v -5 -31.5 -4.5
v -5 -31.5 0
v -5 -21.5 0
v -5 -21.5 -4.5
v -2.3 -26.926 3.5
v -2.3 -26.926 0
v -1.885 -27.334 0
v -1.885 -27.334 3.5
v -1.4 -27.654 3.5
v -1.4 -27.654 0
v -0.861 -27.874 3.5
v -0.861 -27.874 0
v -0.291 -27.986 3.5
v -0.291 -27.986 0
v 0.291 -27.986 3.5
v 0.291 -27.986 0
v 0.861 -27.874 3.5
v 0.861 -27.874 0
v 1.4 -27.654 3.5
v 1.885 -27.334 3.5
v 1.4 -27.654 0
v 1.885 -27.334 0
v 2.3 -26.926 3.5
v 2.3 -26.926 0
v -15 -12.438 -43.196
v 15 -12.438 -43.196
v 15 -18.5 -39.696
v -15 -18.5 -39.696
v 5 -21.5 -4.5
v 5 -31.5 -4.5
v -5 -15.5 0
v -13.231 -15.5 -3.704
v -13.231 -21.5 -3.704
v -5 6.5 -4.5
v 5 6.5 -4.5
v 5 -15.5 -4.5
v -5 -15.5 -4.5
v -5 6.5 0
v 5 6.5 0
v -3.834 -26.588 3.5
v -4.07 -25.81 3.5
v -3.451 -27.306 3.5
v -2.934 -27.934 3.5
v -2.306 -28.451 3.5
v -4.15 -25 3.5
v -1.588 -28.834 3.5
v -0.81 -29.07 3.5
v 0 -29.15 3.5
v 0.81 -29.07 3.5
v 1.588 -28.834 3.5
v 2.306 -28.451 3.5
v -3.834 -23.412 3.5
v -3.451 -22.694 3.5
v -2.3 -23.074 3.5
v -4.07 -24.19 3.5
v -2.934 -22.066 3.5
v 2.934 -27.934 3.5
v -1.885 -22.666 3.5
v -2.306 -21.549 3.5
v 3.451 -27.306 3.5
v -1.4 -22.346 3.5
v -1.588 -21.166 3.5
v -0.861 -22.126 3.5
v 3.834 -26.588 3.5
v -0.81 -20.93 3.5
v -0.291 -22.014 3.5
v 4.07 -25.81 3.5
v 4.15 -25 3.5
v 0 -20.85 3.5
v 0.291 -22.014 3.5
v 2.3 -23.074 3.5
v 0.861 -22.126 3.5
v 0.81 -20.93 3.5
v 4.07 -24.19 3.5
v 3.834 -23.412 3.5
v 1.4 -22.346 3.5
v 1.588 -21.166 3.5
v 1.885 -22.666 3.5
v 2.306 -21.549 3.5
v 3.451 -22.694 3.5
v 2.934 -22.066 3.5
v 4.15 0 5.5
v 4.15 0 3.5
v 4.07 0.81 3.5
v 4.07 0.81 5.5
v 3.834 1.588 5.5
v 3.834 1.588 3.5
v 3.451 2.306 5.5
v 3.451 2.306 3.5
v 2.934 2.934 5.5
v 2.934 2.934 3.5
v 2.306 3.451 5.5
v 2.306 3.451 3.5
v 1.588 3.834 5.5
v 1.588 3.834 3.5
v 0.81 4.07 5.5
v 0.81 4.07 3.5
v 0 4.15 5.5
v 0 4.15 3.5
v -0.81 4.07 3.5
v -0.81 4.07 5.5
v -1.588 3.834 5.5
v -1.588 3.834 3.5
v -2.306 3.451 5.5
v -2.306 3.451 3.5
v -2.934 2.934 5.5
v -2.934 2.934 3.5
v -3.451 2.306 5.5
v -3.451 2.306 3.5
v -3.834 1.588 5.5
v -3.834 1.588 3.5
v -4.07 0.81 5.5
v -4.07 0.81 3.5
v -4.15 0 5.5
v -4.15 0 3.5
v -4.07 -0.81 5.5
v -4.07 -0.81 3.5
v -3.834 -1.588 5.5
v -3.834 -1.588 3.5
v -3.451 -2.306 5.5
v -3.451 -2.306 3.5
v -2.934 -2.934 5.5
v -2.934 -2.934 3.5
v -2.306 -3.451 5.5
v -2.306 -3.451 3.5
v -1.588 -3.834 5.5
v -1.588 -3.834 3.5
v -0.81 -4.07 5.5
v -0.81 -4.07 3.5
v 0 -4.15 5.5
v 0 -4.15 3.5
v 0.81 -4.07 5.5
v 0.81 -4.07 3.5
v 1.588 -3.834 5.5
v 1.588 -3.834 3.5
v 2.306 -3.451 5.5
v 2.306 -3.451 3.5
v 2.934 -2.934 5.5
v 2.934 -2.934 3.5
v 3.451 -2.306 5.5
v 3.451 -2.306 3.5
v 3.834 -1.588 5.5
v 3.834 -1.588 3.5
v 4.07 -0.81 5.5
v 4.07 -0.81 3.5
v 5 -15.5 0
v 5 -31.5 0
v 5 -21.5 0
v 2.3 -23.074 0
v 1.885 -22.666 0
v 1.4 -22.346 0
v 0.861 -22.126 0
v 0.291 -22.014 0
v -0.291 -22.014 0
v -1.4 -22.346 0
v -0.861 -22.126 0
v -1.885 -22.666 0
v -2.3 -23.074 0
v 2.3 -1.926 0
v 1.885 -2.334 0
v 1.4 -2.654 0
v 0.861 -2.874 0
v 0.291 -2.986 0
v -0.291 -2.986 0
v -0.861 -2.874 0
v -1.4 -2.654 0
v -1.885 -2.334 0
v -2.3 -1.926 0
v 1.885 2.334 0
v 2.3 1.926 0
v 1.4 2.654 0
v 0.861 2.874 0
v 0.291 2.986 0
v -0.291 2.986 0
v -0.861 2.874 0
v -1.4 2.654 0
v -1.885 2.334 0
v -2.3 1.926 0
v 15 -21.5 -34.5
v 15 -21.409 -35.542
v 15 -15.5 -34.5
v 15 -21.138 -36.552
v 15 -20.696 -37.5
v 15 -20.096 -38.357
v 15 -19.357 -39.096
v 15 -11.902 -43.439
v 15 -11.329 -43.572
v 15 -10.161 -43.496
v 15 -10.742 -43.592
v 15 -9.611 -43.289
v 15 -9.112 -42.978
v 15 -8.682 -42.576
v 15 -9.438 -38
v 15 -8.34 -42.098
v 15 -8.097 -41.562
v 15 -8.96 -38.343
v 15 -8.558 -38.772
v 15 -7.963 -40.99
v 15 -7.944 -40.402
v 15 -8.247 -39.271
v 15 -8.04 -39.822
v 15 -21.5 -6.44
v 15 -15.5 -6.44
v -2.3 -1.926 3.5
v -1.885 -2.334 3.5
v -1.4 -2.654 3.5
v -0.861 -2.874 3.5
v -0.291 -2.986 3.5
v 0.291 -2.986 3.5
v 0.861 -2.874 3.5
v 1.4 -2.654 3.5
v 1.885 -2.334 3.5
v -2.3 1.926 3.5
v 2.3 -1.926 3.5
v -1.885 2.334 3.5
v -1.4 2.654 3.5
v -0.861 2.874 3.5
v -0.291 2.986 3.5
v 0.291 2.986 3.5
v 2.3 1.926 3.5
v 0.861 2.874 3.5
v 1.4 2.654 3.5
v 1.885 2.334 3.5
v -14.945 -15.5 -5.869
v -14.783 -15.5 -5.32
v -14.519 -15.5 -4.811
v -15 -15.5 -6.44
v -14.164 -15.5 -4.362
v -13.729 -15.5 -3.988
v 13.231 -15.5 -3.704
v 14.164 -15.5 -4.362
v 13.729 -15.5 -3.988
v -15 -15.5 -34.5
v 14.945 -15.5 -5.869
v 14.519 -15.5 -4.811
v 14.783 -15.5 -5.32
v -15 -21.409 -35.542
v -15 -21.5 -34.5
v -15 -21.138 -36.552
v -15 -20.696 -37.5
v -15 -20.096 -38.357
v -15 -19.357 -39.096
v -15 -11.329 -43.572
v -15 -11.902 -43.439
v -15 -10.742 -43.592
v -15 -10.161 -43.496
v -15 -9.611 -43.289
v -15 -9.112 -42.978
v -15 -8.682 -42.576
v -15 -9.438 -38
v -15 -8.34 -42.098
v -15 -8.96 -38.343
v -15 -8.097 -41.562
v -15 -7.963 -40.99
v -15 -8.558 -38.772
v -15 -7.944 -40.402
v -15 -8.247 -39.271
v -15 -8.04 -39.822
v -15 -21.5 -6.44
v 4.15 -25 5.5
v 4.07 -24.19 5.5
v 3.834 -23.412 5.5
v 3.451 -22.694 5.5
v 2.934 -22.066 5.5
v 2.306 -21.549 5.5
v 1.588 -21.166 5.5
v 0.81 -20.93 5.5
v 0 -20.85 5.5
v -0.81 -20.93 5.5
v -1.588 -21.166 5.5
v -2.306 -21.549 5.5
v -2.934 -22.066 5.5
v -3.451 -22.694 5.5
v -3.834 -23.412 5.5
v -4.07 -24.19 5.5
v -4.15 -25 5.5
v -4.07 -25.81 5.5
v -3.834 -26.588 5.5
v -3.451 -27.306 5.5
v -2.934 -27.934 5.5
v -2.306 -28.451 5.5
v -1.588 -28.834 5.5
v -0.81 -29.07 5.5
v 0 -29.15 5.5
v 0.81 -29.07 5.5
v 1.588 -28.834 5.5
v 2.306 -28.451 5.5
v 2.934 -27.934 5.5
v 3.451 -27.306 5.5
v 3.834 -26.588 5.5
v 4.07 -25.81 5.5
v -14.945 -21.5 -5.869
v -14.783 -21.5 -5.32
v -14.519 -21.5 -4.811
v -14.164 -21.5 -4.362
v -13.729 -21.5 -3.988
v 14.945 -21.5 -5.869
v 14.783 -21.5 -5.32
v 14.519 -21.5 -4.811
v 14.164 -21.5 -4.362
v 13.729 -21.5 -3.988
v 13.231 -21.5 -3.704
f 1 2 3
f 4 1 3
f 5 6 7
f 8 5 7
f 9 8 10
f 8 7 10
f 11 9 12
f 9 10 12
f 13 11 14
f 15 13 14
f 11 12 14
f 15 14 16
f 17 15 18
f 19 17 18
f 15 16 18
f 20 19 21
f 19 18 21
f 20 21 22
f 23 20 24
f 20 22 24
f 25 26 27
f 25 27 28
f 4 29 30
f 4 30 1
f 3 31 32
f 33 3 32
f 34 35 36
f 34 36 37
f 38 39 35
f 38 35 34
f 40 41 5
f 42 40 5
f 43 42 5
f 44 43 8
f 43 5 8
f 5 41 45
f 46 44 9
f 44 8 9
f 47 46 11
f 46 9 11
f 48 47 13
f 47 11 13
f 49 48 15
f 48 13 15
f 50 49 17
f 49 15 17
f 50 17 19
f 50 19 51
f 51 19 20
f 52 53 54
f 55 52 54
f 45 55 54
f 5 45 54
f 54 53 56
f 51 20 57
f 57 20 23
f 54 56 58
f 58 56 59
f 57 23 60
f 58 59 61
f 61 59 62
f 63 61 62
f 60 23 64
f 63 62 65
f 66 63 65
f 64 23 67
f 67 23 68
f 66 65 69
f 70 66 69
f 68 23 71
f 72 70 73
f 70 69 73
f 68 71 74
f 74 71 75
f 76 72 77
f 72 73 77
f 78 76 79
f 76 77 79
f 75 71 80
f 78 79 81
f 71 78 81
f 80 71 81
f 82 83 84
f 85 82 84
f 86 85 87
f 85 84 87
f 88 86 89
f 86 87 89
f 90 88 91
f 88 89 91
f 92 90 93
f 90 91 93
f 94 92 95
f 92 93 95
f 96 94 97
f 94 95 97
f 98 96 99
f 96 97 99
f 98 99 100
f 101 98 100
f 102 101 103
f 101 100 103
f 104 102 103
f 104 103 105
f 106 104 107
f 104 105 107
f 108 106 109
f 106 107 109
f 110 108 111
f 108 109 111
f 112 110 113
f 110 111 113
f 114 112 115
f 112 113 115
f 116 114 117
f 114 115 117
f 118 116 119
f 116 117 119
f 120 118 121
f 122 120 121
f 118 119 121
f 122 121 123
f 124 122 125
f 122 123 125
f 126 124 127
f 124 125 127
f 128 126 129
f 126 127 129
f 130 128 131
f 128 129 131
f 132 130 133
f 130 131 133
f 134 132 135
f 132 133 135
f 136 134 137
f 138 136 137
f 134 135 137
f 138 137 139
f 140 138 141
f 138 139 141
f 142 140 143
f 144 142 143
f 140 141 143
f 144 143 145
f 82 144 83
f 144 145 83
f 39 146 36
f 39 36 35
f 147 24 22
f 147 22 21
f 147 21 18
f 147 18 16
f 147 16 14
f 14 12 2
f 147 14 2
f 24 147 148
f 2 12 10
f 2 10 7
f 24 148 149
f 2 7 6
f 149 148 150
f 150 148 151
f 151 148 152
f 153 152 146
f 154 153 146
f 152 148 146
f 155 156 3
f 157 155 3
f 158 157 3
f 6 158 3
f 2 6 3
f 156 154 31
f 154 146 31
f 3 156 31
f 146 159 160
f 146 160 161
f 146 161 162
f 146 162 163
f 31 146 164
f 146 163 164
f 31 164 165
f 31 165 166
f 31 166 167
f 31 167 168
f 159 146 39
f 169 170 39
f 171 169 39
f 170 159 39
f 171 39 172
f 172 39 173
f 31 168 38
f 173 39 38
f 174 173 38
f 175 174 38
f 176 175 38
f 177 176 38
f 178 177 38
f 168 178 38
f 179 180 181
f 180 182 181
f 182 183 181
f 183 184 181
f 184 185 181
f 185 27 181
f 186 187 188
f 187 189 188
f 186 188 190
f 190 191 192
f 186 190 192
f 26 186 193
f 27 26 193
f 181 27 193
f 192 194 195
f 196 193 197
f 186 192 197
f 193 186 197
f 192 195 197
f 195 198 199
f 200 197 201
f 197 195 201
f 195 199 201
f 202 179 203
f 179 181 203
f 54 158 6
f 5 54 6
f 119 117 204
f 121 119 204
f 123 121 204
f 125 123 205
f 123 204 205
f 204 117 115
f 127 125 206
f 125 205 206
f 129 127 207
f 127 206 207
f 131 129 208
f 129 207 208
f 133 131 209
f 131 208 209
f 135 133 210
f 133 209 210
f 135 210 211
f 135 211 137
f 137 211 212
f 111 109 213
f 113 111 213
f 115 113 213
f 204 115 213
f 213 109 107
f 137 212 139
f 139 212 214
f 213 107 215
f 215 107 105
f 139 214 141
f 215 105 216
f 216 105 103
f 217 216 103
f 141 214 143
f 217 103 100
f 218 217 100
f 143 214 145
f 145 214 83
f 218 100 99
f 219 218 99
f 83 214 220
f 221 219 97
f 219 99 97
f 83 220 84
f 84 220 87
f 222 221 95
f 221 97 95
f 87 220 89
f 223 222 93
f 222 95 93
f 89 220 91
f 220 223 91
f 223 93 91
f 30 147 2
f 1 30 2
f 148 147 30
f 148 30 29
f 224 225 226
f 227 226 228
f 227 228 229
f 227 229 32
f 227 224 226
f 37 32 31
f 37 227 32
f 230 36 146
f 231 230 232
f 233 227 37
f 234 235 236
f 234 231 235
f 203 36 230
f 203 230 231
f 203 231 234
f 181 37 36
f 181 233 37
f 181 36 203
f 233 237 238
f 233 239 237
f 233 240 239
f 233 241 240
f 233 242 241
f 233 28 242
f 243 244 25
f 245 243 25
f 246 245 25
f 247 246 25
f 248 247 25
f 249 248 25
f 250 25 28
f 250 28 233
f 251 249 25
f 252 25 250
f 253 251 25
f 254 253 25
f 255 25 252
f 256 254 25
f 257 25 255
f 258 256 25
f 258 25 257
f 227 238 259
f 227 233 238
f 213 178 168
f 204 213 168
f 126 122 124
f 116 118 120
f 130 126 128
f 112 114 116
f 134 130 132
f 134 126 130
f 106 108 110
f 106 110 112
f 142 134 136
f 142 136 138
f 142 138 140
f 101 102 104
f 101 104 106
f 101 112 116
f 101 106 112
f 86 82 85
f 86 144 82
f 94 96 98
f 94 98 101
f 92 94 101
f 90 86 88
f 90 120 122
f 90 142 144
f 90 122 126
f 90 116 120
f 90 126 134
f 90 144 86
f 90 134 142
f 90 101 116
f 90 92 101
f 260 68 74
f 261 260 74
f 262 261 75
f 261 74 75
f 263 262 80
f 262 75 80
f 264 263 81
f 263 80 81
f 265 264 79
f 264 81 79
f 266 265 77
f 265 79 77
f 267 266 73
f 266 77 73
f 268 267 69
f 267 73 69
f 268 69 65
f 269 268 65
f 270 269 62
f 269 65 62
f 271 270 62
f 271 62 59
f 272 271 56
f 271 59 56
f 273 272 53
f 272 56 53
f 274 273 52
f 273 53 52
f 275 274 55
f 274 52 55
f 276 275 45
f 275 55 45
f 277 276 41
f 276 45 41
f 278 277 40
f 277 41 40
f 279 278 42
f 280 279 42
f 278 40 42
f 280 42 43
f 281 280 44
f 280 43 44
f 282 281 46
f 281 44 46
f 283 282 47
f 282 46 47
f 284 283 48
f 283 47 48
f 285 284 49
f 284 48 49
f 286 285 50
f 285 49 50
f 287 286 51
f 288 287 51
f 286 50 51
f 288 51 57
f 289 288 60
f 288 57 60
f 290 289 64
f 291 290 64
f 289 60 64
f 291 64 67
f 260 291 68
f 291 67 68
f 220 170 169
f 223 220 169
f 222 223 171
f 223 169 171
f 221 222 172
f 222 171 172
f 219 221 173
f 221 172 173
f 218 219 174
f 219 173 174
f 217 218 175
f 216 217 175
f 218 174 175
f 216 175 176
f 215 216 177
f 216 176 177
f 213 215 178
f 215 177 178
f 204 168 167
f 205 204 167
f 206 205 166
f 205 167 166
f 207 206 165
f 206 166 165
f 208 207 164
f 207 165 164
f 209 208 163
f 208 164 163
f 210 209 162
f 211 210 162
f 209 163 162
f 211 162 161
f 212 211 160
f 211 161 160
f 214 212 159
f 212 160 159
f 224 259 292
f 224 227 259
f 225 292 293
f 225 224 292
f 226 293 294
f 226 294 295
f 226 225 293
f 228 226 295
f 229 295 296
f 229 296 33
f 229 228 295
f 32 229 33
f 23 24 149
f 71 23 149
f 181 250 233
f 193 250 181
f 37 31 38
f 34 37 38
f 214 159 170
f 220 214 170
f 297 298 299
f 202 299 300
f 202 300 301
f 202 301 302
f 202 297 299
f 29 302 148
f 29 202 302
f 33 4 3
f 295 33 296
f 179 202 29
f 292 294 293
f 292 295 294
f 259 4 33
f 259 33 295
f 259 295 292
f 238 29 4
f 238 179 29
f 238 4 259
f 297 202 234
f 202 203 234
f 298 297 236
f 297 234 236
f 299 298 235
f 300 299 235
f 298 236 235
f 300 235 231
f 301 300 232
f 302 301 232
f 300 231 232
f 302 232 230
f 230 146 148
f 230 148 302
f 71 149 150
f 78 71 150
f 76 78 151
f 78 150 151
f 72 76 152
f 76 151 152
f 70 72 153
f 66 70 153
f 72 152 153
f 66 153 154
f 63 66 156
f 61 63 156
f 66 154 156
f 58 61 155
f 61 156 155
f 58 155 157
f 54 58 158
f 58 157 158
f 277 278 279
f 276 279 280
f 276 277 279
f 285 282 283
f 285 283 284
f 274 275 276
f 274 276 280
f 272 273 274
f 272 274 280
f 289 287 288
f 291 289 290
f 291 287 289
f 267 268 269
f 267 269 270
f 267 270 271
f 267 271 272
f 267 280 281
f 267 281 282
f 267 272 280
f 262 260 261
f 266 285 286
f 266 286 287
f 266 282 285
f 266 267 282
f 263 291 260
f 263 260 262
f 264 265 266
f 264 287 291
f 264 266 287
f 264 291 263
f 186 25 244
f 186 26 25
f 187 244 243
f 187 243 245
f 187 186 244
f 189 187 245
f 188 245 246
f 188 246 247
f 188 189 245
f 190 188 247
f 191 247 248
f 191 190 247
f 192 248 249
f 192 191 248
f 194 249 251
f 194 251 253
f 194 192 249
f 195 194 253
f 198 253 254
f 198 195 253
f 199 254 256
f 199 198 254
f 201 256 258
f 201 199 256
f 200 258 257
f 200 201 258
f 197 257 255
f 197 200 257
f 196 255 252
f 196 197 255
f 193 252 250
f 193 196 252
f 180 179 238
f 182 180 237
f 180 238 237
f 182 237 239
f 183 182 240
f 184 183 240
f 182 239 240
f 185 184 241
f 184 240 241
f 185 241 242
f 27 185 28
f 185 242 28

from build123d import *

# Parameters (mm, degrees)
EXTRUDE_1_DEPTH   = 3.5
EXTRUDE_1_2_DEPTH = 3.5
SKETCH_2_R        = 4.15
EXTRUDE_2_DEPTH   = 2
SKETCH_3_W        = 10
SKETCH_3_H        = 38
EXTRUDE_3_DEPTH   = 4.5
SKETCH_5_W        = 30
SKETCH_5_H        = 6
EXTRUDE_4_DEPTH   = 25
EXTRUDE_5_DEPTH   = 6
SKETCH_10_W       = 30
SKETCH_10_H       = 6
SKETCH_11_W       = 30
SKETCH_11_H       = 3
REVOLVE_1_ANGLE   = 180
FILLET_1_R        = 3


with BuildPart() as part:
    # 草图1 → 凸台-拉伸1 (new body)
    with BuildSketch(Plane.XY):
        with BuildLine():
            Line((-2.3, 1.926136028), (-2.3, -1.926136028))
            ThreePointArc((-2.3, -1.926136028), (0, -3), (2.3, -1.926136028))
            Line((2.3, -1.926136028), (2.3, 1.926136028))
            ThreePointArc((2.3, 1.926136028), (0, 3), (-2.3, 1.926136028))
        make_face()
    extrude(amount=EXTRUDE_1_DEPTH)



with BuildPart() as body_2:
    # 草图1 → Extrude 1 2 (new body)
    with BuildSketch(Plane.XY):
        with BuildLine():
            Line((-2.3, -23.073863972), (-2.3, -26.926136028))
            ThreePointArc((-2.3, -26.926136028), (0, -28), (2.3, -26.926136028))
            Line((2.3, -26.926136028), (2.3, -23.073863972))
            ThreePointArc((2.3, -23.073863972), (0, -22), (-2.3, -23.073863972))
        make_face()
    extrude(amount=EXTRUDE_1_2_DEPTH)


with BuildPart() as part_1:
    add(part.part)

    add(body_2.part)  # 凸台-拉伸2 merges body 2
    # 草图2 → 凸台-拉伸2 (add)
    with BuildSketch(Plane.XY.offset(3.5)):
        Circle(SKETCH_2_R)
        with Locations((0, -25)):
            Circle(SKETCH_2_R)
    extrude(amount=EXTRUDE_2_DEPTH)

    # 草图3 → 凸台-拉伸3 (add)
    with BuildSketch(Plane(origin=(0, 0, 0), x_dir=(-1, 0, 0), z_dir=(0, 0, -1))):
        with Locations((0, -12.5)):
            Rectangle(SKETCH_3_W, SKETCH_3_H)
    extrude(amount=EXTRUDE_3_DEPTH)

    # 草图5 → 凸台-拉伸4 (add)
    with BuildSketch(Plane(origin=(0, 0, -4.5), x_dir=(-1, 0, 0), z_dir=(0, 0, -1))):
        with Locations((0, -18.5)):
            Rectangle(SKETCH_5_W, SKETCH_5_H)
    extrude(amount=EXTRUDE_4_DEPTH)

    # 草图8 → 凸台-拉伸5 (add)
    with BuildSketch(Plane(origin=(0, -15.5, 0), x_dir=(1, 0, 0), z_dir=(0, 1, 0))):
        Polygon((15, 4.5), (5, 4.5), (5, 0), align=None)
        Polygon((-15, 4.5), (-5, 4.5), (-5, 0), align=None)
    extrude(amount=-EXTRUDE_5_DEPTH)

    # 扫描1: sweep along a path in 草图9
    with BuildLine(Plane(origin=(0, 0, 0), x_dir=(0, 0, -1), z_dir=(1, 0, 0))) as sweep_1_path:
        Line((29.5, -18.5), (34.5, -18.5))
        ThreePointArc((34.5, -18.5), (36, -18.098076211), (37.098076211, -17))
        Line((37.098076211, -17), (40.598076211, -10.937822174))
    # 草图10 → 扫描1 (sweep)
    with BuildSketch(Plane(origin=(0, 0, -29.5), x_dir=(-1, 0, 0), z_dir=(0, 0, -1))):
        with Locations((0, -18.5)):
            Rectangle(SKETCH_10_W, SKETCH_10_H)
    sweep(path=sweep_1_path.line)

    # 草图11 → 旋转1 (revolve)
    with BuildSketch(Plane(origin=(0, 9.376116042, -5.413303121), x_dir=(1, 0, 0), z_dir=(0, 0.866025404, -0.5))):
        with Locations((0, 42.127876431)):
            Rectangle(SKETCH_11_W, SKETCH_11_H)
    revolve(axis=Axis((15, -10.937822174, -40.598076211), (1, 0, 0)), revolution_arc=REVOLVE_1_ANGLE)

    # 圆角1
    fillet_1_edges = [part_1.edges().sort_by_distance(p)[0] for p in [
        (15, -18.5, -4.5),
        (-15, -18.5, -4.5),
    ]]
    fillet(fillet_1_edges, radius=FILLET_1_R)


solid = part_1.part
